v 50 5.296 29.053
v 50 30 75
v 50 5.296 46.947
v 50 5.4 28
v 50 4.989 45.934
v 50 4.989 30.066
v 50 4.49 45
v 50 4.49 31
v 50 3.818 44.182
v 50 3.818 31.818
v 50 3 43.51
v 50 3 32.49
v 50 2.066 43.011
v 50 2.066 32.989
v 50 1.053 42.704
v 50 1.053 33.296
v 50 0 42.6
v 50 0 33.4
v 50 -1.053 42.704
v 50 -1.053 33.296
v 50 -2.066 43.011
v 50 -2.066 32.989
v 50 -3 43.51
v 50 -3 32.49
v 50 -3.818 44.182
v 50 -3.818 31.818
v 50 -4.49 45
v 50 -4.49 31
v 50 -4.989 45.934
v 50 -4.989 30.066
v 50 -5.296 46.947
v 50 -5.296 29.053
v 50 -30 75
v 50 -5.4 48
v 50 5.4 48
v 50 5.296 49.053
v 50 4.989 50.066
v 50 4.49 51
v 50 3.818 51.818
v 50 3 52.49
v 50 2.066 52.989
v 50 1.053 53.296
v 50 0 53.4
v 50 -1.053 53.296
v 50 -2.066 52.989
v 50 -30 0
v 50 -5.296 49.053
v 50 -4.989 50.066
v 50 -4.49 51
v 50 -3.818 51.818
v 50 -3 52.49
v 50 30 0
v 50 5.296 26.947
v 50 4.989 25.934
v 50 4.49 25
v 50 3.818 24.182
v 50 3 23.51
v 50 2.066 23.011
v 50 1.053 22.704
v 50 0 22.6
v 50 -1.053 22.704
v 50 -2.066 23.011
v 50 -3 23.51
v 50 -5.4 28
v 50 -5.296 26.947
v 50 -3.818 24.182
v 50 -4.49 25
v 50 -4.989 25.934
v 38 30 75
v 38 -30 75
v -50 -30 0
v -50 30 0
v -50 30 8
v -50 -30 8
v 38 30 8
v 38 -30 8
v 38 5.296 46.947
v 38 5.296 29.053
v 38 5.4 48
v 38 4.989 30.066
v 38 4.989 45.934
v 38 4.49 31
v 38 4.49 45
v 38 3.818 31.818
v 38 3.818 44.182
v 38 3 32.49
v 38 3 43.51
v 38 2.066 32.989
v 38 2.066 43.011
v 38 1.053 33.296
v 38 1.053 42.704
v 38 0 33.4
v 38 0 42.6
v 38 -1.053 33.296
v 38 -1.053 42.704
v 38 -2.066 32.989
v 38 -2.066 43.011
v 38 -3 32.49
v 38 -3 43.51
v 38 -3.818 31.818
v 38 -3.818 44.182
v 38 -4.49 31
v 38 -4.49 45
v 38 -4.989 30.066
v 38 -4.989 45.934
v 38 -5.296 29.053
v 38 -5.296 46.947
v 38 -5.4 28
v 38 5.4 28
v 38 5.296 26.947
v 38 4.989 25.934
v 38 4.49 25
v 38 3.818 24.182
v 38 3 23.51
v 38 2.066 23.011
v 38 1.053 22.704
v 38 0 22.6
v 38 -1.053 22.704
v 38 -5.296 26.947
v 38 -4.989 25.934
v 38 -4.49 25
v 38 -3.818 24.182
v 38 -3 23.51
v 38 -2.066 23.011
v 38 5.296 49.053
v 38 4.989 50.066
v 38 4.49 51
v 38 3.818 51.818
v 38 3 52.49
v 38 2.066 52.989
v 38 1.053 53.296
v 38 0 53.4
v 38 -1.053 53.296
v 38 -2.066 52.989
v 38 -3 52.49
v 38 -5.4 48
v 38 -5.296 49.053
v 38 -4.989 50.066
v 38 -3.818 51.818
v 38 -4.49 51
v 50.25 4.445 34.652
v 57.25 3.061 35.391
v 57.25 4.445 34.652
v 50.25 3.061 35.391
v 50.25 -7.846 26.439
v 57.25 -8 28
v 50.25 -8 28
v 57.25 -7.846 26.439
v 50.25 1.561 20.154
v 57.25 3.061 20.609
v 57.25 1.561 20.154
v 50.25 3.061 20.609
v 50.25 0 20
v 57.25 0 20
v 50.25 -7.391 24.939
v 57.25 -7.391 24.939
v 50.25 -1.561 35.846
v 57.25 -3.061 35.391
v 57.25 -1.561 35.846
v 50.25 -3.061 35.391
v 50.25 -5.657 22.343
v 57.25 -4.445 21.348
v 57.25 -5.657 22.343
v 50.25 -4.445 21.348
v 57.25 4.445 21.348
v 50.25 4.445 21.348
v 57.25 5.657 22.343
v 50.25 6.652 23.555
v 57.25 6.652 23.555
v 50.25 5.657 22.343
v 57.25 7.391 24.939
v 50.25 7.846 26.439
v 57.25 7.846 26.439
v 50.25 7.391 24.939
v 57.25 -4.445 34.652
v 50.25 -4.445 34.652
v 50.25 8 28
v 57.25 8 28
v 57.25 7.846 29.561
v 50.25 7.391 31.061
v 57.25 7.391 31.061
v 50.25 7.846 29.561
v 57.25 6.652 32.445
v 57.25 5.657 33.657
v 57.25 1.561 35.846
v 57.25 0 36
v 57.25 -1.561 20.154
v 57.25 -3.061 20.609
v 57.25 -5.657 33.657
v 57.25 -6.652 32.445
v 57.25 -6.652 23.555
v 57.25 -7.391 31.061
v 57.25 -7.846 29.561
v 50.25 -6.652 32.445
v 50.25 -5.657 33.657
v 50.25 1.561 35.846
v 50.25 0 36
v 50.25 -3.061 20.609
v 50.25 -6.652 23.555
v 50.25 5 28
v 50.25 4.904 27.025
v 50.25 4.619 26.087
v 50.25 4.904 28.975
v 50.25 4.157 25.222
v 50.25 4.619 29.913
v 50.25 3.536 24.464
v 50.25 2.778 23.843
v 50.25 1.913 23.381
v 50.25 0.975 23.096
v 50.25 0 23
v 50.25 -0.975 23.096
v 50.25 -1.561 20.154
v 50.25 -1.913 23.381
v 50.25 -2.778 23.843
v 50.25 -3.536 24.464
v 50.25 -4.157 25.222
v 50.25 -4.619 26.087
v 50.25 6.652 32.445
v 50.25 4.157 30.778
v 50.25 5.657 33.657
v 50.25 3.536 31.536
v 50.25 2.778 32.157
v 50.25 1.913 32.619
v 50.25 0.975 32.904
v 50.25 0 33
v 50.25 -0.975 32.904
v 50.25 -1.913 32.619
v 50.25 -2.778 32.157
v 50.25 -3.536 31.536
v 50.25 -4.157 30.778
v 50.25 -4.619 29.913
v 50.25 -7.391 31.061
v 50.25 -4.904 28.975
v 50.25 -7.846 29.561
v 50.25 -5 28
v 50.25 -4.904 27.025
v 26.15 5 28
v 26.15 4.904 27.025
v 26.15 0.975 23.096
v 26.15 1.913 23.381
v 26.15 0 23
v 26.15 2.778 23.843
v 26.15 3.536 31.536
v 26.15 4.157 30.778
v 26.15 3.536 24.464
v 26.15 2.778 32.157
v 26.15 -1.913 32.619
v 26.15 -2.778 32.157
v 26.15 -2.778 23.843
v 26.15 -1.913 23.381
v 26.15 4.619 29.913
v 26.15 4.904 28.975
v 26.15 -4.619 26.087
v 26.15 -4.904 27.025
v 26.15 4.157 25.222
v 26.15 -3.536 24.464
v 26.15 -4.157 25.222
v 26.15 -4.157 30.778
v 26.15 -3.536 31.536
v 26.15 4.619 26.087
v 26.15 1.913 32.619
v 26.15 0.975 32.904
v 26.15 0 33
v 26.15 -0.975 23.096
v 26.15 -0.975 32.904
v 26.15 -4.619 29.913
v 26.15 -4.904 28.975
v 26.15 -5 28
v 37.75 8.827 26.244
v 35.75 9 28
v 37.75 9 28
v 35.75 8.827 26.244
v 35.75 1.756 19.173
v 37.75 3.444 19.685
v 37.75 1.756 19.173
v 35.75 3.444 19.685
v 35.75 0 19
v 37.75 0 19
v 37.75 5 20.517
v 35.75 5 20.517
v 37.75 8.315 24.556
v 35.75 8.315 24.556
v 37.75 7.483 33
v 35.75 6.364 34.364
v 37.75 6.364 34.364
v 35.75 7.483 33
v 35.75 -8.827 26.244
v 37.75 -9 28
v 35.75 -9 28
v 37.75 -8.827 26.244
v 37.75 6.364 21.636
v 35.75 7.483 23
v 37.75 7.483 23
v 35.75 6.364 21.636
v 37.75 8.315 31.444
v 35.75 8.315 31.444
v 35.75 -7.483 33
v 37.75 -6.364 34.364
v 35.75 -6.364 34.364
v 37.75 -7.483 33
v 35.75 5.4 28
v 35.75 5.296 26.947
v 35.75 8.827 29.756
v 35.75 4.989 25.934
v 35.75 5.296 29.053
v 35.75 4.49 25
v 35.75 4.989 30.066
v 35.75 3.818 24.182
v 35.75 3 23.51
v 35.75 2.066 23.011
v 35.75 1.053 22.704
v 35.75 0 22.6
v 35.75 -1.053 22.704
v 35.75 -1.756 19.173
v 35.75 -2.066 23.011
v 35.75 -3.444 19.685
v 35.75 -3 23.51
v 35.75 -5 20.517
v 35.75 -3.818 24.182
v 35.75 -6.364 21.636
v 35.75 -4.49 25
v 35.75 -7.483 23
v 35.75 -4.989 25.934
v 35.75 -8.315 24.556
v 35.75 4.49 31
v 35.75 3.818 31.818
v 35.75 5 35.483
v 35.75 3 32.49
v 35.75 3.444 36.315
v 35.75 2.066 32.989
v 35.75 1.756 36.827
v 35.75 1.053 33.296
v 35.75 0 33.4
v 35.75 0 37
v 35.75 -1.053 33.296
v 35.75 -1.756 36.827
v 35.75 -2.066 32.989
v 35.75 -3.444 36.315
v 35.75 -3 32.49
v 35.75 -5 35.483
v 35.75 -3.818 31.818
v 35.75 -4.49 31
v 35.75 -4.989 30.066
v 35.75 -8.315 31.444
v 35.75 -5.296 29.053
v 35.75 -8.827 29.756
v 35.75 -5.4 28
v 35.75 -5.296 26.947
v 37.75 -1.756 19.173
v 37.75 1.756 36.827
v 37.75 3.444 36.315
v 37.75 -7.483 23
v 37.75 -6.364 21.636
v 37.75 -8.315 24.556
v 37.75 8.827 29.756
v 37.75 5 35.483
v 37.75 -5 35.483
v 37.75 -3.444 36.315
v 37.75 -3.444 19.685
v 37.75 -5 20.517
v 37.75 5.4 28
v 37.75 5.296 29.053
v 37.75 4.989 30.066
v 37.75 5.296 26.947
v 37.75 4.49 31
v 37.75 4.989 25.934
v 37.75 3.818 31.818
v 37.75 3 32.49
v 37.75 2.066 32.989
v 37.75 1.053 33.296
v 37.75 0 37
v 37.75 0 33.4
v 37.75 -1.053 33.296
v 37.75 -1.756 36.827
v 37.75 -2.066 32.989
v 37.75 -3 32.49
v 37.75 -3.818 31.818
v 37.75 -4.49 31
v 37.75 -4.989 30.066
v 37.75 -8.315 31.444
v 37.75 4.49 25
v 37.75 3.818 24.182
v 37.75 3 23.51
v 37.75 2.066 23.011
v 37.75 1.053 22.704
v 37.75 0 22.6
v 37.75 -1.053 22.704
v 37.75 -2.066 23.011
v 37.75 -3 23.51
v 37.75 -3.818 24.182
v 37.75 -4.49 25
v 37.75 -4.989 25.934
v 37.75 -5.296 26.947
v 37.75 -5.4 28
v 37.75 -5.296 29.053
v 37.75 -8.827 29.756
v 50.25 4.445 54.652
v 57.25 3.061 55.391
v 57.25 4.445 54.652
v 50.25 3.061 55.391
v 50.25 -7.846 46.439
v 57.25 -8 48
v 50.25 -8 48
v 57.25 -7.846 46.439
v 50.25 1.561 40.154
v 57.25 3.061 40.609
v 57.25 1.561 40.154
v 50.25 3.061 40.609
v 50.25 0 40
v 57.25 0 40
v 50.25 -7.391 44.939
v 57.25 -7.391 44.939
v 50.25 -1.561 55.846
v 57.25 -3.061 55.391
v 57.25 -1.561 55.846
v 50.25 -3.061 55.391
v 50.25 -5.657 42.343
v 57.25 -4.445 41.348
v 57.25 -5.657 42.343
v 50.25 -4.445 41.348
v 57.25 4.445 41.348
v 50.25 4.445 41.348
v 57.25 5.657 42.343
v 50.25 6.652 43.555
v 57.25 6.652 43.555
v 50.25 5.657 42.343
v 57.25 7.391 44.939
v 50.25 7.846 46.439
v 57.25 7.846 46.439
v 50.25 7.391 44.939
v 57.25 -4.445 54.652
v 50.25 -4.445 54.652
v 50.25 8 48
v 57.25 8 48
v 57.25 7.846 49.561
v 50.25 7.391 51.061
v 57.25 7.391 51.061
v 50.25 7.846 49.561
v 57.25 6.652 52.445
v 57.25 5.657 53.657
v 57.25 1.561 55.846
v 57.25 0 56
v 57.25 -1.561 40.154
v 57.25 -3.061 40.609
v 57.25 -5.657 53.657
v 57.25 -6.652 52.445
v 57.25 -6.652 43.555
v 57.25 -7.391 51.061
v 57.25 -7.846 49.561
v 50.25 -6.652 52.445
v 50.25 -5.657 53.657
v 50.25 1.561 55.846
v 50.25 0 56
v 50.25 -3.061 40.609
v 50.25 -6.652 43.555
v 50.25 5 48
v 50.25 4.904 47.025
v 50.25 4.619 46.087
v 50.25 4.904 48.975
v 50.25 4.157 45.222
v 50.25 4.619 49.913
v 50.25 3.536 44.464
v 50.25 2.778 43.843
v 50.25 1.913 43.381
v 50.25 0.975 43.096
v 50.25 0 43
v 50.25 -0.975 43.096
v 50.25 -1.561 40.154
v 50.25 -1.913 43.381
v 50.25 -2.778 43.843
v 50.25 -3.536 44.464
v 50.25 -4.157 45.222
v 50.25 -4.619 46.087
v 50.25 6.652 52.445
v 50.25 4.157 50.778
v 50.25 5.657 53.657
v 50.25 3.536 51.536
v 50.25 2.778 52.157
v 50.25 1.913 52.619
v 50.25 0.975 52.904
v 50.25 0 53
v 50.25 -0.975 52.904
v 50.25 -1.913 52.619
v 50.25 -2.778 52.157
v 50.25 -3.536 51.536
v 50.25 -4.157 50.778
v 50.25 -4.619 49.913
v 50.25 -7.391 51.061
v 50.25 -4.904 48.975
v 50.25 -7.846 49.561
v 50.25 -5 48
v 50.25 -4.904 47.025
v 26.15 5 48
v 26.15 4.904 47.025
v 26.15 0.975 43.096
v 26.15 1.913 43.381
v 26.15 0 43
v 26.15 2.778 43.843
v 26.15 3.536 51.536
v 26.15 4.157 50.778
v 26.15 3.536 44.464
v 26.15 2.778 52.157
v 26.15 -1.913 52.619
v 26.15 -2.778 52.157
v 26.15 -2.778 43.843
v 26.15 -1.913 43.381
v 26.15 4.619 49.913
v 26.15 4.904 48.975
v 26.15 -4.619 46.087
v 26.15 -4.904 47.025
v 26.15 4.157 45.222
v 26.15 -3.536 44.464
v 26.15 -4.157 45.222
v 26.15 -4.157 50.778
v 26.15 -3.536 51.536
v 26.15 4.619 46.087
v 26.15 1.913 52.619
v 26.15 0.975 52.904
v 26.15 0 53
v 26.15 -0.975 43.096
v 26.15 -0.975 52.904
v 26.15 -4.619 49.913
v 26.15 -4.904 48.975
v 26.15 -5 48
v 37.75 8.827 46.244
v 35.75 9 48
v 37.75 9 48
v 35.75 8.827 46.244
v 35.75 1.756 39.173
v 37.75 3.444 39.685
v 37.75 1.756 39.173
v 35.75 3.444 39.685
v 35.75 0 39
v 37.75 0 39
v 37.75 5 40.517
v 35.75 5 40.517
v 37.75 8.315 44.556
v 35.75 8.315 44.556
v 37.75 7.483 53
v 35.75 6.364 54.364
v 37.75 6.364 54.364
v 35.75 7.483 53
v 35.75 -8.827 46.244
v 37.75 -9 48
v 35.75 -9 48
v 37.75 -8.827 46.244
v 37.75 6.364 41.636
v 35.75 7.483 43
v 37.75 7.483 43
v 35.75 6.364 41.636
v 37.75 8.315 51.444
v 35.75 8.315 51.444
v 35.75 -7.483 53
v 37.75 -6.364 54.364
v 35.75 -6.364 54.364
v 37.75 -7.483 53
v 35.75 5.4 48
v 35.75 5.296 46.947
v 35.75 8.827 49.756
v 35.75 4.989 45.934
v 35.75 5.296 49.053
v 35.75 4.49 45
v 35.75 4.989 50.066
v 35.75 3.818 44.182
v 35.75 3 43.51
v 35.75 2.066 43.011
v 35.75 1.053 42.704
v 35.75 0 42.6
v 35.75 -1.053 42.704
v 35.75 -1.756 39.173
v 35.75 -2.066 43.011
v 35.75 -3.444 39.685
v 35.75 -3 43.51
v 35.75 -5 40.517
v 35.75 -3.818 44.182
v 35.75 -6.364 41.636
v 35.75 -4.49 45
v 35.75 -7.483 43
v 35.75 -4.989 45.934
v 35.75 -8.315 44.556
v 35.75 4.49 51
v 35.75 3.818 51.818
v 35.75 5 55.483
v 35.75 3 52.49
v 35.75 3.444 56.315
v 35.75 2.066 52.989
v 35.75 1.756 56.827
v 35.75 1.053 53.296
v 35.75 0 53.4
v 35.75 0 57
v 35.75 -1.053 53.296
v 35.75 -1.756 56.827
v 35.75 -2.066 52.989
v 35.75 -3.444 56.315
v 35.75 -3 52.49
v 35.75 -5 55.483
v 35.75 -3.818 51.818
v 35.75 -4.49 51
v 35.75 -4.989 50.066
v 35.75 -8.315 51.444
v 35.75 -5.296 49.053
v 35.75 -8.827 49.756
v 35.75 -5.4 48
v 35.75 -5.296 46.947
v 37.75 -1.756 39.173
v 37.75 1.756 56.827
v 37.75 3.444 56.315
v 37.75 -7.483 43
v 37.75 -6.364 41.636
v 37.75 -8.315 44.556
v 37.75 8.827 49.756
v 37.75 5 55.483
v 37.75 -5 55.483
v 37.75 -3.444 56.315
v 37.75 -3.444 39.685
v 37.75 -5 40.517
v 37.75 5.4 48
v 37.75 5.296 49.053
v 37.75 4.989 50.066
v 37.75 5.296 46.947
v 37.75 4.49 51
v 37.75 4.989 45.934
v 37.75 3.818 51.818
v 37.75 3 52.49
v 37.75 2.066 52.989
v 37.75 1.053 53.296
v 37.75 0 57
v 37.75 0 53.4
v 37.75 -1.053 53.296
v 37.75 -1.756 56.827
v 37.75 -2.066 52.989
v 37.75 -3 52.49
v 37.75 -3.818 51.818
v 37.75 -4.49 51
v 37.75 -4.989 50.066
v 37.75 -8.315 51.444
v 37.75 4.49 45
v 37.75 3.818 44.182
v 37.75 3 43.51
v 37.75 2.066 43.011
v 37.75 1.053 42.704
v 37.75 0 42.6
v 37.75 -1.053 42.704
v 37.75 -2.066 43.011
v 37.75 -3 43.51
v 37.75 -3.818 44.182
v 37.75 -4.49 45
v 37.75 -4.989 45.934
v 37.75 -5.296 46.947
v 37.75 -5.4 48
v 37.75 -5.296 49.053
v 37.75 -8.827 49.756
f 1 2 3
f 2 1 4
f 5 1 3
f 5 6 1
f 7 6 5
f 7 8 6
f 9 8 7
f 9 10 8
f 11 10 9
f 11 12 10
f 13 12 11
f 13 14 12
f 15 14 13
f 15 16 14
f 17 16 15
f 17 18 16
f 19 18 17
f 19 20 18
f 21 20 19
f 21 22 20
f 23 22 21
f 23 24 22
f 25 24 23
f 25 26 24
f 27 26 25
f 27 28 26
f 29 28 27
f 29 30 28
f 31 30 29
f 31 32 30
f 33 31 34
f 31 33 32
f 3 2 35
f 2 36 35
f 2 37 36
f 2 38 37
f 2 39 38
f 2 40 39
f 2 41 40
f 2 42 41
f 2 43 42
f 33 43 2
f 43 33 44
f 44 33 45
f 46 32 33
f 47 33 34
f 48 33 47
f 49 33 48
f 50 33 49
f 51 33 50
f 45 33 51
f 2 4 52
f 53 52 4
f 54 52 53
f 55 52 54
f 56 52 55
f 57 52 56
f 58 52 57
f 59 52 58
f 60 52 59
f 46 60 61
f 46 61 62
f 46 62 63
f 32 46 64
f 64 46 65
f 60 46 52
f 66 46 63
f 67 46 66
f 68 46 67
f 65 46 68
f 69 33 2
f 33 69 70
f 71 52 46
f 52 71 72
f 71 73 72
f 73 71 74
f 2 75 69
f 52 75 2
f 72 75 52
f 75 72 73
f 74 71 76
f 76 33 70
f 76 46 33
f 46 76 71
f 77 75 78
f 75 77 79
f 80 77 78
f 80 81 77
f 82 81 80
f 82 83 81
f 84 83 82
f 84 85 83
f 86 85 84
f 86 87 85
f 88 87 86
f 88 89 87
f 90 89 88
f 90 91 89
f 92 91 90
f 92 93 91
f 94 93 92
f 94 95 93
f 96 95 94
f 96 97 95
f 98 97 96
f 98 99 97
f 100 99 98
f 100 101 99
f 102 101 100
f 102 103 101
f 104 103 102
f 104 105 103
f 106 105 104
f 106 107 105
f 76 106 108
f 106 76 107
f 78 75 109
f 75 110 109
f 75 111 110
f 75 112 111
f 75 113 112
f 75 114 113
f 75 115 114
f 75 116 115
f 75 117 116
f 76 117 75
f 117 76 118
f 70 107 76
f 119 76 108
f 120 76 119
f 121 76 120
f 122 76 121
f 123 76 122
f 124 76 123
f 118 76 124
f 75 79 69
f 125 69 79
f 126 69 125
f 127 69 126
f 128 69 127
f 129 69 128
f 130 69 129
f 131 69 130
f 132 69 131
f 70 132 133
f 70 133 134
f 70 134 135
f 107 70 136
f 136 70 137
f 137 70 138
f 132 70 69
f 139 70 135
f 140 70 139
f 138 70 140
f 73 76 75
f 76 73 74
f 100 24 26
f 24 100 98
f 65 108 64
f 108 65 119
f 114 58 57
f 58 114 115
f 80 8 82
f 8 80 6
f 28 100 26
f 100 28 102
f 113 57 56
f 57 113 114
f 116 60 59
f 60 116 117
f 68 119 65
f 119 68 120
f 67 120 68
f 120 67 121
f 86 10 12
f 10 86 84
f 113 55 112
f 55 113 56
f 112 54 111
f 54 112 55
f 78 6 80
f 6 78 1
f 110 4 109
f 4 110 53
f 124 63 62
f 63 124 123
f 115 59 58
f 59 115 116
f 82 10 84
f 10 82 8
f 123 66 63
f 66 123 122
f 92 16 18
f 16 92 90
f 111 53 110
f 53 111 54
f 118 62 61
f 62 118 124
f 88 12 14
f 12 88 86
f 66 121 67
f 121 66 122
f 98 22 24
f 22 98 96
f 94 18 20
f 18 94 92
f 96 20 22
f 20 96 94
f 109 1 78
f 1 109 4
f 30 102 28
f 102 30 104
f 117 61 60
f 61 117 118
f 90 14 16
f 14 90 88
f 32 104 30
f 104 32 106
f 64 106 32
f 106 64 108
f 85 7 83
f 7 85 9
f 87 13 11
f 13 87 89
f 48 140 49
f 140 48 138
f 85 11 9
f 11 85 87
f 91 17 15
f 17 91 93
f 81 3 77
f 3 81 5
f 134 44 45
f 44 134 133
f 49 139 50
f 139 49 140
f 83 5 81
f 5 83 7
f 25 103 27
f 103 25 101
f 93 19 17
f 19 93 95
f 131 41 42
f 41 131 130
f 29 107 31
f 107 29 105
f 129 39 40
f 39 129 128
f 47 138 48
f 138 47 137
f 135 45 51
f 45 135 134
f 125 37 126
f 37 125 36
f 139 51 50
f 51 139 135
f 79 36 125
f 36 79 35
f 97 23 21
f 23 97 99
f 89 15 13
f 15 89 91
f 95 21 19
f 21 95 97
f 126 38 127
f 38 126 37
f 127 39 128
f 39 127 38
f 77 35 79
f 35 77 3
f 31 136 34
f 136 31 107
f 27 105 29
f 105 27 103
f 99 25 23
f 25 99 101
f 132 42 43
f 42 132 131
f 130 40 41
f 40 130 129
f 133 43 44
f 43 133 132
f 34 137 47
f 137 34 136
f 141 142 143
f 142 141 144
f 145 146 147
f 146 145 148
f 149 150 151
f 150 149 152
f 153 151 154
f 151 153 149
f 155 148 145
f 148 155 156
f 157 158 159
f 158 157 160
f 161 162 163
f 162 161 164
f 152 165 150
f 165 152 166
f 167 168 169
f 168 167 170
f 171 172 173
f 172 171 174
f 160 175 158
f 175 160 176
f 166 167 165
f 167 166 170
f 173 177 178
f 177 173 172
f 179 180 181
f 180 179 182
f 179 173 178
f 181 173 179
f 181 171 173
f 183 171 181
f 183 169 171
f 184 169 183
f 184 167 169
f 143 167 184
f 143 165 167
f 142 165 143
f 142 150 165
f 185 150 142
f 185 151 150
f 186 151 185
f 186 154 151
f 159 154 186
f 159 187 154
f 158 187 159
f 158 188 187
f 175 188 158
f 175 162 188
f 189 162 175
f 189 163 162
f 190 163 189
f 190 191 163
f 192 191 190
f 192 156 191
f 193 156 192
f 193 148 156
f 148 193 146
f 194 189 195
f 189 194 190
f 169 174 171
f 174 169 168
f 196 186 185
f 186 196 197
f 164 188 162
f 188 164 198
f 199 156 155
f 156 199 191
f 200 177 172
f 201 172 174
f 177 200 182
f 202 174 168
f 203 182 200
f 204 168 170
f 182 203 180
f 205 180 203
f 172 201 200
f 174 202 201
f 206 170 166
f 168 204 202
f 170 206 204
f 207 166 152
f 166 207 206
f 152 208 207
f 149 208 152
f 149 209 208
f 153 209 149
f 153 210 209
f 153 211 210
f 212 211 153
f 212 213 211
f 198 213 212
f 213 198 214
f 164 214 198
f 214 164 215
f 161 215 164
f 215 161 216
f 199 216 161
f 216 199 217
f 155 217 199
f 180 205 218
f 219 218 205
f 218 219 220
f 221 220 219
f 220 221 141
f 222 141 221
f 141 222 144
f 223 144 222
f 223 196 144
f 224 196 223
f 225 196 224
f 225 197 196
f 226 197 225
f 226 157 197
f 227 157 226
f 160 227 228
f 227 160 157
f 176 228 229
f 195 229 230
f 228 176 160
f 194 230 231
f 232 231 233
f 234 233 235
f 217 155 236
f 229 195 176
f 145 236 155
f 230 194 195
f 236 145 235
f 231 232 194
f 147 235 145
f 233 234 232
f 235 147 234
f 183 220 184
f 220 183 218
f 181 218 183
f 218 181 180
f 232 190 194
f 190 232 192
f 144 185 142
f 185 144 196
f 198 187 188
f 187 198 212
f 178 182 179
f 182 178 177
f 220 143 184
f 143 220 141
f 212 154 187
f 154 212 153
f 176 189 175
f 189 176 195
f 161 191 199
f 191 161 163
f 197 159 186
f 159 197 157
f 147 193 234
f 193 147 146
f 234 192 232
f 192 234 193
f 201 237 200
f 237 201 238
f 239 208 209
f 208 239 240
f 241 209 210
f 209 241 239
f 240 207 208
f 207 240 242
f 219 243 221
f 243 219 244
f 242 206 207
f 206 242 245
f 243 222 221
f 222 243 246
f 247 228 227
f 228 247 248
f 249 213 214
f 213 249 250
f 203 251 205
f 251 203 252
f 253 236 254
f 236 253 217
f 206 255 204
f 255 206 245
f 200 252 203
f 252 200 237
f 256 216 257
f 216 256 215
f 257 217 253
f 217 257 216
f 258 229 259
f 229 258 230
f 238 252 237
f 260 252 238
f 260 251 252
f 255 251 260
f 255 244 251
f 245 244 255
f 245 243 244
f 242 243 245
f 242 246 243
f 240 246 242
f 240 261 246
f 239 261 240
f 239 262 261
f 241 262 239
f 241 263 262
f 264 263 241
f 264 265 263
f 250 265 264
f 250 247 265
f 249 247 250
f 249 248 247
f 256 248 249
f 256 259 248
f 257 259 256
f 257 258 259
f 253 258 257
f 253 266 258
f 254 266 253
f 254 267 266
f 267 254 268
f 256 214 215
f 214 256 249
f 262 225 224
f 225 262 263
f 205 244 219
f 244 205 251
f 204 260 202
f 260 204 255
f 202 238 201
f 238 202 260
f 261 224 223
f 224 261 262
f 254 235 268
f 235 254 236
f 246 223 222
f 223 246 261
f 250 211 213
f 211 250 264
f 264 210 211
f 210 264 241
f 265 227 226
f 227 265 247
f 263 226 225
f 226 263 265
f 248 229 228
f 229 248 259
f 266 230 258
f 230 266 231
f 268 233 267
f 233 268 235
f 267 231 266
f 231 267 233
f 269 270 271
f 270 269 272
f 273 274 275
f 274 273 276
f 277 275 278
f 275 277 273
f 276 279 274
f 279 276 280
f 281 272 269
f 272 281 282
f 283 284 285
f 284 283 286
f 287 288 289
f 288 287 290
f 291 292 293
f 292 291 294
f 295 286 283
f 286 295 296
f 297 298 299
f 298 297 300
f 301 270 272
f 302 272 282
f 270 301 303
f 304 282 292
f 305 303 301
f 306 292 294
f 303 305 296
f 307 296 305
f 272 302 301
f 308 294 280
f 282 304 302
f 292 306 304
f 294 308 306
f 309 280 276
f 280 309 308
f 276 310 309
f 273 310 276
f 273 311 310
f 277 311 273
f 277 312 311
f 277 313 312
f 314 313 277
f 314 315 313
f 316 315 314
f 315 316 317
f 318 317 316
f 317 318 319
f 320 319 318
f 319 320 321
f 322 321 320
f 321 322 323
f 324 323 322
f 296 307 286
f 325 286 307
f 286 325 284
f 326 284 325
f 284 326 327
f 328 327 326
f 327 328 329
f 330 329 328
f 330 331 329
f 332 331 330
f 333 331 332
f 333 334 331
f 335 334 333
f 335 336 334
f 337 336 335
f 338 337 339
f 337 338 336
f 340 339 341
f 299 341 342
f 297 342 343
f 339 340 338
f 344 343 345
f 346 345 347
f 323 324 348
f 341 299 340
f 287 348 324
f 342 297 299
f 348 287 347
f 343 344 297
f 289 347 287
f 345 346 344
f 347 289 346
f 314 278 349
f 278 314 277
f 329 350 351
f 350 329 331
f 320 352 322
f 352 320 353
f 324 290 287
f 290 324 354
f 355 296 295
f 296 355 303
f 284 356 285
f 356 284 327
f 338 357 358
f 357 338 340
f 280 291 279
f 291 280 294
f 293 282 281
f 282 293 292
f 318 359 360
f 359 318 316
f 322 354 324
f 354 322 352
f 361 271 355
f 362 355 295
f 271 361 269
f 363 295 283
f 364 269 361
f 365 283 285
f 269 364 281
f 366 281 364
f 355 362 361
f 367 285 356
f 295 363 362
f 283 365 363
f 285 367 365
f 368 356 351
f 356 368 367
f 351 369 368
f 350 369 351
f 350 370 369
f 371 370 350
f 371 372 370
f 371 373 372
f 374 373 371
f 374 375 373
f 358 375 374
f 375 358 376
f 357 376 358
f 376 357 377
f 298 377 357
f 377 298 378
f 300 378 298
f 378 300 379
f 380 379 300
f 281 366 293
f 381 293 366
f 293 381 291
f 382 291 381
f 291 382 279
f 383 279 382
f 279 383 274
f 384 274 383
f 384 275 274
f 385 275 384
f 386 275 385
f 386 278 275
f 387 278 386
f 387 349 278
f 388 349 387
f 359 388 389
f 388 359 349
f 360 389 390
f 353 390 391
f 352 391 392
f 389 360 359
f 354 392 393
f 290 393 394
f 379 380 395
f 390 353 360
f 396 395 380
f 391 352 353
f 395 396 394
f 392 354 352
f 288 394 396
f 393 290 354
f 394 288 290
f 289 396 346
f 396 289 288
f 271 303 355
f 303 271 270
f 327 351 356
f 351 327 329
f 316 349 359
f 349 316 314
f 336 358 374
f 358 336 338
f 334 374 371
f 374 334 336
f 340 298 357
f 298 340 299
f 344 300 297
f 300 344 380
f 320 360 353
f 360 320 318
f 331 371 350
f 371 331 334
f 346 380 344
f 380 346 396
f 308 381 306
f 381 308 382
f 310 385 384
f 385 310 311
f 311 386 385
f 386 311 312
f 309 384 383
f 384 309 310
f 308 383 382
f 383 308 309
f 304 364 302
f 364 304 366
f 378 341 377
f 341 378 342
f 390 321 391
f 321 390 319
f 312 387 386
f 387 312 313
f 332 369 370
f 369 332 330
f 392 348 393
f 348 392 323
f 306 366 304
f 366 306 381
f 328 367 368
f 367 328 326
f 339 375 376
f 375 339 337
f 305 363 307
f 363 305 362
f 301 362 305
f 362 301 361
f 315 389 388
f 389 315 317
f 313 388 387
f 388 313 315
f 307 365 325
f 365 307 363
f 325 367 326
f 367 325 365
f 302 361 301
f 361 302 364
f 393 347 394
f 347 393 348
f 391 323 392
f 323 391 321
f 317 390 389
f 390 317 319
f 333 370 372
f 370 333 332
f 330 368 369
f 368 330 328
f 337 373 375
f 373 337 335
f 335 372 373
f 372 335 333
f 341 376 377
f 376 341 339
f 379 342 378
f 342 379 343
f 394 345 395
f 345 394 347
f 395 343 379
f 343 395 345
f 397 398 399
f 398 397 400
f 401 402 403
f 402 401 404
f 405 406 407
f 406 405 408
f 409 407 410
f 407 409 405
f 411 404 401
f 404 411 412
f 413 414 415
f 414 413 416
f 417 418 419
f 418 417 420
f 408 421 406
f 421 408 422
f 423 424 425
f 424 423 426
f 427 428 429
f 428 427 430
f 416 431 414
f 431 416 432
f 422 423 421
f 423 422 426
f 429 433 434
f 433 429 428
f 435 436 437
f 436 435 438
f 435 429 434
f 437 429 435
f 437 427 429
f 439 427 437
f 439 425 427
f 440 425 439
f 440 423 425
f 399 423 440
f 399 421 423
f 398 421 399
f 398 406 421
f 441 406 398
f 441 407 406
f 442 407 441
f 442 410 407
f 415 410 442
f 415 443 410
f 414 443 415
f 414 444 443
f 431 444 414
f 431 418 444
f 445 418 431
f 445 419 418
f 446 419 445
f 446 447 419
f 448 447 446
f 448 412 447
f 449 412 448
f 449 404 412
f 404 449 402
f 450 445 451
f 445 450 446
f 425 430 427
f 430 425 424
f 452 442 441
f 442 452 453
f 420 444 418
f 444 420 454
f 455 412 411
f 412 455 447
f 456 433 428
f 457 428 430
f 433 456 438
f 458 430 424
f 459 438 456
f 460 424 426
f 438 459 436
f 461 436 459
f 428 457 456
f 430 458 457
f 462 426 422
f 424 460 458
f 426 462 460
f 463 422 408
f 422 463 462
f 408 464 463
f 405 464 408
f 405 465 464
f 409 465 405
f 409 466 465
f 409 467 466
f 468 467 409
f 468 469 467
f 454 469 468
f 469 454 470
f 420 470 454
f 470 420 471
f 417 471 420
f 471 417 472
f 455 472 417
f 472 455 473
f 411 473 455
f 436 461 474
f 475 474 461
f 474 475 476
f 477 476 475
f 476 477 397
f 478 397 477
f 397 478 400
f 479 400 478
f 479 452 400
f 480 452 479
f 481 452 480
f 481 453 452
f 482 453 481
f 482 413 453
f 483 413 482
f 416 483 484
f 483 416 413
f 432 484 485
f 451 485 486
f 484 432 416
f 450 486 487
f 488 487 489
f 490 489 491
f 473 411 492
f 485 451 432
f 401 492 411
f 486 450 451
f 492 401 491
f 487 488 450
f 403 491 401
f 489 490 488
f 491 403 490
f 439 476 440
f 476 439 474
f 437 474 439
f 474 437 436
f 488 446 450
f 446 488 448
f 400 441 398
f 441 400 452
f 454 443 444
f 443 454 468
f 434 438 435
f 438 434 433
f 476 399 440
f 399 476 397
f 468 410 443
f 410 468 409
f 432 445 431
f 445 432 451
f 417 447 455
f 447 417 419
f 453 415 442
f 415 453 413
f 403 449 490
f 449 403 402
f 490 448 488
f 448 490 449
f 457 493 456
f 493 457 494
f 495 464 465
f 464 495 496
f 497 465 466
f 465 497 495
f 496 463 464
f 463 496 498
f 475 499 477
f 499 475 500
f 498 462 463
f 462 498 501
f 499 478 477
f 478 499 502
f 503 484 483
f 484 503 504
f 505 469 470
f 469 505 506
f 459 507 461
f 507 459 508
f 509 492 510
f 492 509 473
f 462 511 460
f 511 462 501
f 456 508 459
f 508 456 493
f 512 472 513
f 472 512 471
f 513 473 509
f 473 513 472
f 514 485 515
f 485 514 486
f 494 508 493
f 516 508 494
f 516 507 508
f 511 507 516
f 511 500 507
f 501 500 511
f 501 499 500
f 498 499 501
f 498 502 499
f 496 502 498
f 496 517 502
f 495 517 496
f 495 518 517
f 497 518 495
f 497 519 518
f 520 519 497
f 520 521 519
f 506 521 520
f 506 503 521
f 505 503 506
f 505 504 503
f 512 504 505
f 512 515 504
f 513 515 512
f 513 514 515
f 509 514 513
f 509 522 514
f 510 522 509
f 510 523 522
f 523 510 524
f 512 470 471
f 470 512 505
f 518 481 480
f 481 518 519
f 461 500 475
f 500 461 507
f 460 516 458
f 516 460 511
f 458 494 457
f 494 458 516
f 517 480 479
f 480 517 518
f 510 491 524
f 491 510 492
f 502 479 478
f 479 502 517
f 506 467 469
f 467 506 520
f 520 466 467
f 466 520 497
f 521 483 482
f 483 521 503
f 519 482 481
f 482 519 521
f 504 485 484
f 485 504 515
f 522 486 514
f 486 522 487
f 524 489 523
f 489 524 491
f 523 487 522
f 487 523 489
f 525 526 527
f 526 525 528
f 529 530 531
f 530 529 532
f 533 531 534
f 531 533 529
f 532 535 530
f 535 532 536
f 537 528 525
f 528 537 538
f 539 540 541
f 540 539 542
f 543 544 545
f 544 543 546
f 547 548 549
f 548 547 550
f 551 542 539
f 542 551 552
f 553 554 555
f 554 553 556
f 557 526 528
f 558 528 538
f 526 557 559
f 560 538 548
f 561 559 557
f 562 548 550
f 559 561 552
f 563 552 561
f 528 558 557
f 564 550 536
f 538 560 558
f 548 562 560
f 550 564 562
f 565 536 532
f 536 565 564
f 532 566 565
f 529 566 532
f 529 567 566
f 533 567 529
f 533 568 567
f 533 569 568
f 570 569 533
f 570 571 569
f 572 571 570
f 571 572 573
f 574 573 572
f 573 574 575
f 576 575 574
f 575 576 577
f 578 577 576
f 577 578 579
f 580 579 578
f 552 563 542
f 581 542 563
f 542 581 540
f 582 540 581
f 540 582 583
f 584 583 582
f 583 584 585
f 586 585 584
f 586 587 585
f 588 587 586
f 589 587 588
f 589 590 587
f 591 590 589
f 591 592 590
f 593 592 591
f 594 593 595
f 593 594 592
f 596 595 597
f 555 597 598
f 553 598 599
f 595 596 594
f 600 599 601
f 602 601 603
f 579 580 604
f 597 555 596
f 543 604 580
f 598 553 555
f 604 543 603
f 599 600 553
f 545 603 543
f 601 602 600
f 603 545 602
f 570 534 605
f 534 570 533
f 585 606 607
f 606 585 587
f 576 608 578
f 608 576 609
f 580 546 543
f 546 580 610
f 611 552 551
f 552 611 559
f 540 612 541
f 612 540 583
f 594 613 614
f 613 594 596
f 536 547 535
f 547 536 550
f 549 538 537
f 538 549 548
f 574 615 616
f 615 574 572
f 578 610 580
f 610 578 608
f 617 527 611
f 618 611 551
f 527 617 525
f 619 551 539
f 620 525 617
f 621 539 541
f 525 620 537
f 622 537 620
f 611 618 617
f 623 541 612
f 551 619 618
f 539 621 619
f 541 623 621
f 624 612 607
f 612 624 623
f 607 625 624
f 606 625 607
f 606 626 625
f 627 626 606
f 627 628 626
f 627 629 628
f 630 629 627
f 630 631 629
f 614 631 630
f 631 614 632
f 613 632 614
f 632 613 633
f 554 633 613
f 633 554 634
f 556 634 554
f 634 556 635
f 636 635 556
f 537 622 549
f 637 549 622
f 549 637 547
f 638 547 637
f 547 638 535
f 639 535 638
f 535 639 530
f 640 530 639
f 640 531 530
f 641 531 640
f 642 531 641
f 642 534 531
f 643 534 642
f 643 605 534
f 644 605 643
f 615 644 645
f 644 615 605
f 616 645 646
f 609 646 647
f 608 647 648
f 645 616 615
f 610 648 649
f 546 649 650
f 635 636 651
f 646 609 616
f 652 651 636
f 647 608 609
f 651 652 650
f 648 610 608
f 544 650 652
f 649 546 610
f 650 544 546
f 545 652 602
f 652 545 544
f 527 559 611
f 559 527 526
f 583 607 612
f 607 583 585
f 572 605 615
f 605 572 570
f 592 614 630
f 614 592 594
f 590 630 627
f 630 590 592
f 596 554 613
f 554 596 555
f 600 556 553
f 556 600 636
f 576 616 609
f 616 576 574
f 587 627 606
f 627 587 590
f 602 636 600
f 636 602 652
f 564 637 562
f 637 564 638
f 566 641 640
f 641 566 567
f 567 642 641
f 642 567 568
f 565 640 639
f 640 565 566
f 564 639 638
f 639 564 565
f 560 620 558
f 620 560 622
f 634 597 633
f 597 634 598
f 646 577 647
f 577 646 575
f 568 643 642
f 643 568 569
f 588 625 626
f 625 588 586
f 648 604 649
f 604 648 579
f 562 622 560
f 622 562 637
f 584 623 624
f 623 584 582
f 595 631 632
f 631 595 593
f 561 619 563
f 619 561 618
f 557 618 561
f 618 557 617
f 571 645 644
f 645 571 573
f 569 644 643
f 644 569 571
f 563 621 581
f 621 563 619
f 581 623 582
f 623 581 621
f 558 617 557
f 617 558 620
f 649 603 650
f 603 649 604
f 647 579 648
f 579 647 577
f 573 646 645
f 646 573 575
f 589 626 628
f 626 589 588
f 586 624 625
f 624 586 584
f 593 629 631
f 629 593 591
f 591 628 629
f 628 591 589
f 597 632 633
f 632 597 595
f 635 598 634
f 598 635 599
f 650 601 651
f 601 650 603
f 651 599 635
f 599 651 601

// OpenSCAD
$fn = 32;

// ------------------------------------------------------------------------
// Bolted bracket: 100 x 60 mm bracket with 2 bolt joints
// Every part is its own module, assembly() places them once.
// ------------------------------------------------------------------------

// --- part 1 ---
module bracket() {
  difference() {
    translate([-50, -30, 0]) cube([100, 60, 75]);
    translate([-51, -31, 8]) cube([89, 62, 68]);
    translate([44, 0, 28]) rotate([0, 90, 0]) cylinder(h = 14, d = 10.8, center = true);
    translate([44, 0, 48]) rotate([0, 90, 0]) cylinder(h = 14, d = 10.8, center = true);
  }
}

// --- part 2 ---
module bolt1() {
  cylinder(h = 7, d = 16);
  translate([0, 0, -24.1]) cylinder(h = 24.1, d = 10);
}

// --- part 3 ---
module washer1() {
  difference() {
      translate([0, 0, 0]) cylinder(h = 2, d = 18);
      translate([0, 0, -1]) cylinder(h = 4, d = 10.8);
    }
}

// --- part 4 ---
module bolt2() {
  cylinder(h = 7, d = 16);
  translate([0, 0, -24.1]) cylinder(h = 24.1, d = 10);
}

// --- part 5 ---
module washer2() {
  difference() {
      translate([0, 0, 0]) cylinder(h = 2, d = 18);
      translate([0, 0, -1]) cylinder(h = 4, d = 10.8);
    }
}

// --- assembly ---
module assembly() {
  translate([0, 0, 0]) rotate([0, 0, 0]) bracket();
  translate([50.25, 0, 28]) rotate([0, 90, 0]) bolt1();
  translate([35.75, 0, 28]) rotate([0, 90, 0]) washer1();
  translate([50.25, 0, 48]) rotate([0, 90, 0]) bolt2();
  translate([35.75, 0, 48]) rotate([0, 90, 0]) washer2();
}

assembly();
